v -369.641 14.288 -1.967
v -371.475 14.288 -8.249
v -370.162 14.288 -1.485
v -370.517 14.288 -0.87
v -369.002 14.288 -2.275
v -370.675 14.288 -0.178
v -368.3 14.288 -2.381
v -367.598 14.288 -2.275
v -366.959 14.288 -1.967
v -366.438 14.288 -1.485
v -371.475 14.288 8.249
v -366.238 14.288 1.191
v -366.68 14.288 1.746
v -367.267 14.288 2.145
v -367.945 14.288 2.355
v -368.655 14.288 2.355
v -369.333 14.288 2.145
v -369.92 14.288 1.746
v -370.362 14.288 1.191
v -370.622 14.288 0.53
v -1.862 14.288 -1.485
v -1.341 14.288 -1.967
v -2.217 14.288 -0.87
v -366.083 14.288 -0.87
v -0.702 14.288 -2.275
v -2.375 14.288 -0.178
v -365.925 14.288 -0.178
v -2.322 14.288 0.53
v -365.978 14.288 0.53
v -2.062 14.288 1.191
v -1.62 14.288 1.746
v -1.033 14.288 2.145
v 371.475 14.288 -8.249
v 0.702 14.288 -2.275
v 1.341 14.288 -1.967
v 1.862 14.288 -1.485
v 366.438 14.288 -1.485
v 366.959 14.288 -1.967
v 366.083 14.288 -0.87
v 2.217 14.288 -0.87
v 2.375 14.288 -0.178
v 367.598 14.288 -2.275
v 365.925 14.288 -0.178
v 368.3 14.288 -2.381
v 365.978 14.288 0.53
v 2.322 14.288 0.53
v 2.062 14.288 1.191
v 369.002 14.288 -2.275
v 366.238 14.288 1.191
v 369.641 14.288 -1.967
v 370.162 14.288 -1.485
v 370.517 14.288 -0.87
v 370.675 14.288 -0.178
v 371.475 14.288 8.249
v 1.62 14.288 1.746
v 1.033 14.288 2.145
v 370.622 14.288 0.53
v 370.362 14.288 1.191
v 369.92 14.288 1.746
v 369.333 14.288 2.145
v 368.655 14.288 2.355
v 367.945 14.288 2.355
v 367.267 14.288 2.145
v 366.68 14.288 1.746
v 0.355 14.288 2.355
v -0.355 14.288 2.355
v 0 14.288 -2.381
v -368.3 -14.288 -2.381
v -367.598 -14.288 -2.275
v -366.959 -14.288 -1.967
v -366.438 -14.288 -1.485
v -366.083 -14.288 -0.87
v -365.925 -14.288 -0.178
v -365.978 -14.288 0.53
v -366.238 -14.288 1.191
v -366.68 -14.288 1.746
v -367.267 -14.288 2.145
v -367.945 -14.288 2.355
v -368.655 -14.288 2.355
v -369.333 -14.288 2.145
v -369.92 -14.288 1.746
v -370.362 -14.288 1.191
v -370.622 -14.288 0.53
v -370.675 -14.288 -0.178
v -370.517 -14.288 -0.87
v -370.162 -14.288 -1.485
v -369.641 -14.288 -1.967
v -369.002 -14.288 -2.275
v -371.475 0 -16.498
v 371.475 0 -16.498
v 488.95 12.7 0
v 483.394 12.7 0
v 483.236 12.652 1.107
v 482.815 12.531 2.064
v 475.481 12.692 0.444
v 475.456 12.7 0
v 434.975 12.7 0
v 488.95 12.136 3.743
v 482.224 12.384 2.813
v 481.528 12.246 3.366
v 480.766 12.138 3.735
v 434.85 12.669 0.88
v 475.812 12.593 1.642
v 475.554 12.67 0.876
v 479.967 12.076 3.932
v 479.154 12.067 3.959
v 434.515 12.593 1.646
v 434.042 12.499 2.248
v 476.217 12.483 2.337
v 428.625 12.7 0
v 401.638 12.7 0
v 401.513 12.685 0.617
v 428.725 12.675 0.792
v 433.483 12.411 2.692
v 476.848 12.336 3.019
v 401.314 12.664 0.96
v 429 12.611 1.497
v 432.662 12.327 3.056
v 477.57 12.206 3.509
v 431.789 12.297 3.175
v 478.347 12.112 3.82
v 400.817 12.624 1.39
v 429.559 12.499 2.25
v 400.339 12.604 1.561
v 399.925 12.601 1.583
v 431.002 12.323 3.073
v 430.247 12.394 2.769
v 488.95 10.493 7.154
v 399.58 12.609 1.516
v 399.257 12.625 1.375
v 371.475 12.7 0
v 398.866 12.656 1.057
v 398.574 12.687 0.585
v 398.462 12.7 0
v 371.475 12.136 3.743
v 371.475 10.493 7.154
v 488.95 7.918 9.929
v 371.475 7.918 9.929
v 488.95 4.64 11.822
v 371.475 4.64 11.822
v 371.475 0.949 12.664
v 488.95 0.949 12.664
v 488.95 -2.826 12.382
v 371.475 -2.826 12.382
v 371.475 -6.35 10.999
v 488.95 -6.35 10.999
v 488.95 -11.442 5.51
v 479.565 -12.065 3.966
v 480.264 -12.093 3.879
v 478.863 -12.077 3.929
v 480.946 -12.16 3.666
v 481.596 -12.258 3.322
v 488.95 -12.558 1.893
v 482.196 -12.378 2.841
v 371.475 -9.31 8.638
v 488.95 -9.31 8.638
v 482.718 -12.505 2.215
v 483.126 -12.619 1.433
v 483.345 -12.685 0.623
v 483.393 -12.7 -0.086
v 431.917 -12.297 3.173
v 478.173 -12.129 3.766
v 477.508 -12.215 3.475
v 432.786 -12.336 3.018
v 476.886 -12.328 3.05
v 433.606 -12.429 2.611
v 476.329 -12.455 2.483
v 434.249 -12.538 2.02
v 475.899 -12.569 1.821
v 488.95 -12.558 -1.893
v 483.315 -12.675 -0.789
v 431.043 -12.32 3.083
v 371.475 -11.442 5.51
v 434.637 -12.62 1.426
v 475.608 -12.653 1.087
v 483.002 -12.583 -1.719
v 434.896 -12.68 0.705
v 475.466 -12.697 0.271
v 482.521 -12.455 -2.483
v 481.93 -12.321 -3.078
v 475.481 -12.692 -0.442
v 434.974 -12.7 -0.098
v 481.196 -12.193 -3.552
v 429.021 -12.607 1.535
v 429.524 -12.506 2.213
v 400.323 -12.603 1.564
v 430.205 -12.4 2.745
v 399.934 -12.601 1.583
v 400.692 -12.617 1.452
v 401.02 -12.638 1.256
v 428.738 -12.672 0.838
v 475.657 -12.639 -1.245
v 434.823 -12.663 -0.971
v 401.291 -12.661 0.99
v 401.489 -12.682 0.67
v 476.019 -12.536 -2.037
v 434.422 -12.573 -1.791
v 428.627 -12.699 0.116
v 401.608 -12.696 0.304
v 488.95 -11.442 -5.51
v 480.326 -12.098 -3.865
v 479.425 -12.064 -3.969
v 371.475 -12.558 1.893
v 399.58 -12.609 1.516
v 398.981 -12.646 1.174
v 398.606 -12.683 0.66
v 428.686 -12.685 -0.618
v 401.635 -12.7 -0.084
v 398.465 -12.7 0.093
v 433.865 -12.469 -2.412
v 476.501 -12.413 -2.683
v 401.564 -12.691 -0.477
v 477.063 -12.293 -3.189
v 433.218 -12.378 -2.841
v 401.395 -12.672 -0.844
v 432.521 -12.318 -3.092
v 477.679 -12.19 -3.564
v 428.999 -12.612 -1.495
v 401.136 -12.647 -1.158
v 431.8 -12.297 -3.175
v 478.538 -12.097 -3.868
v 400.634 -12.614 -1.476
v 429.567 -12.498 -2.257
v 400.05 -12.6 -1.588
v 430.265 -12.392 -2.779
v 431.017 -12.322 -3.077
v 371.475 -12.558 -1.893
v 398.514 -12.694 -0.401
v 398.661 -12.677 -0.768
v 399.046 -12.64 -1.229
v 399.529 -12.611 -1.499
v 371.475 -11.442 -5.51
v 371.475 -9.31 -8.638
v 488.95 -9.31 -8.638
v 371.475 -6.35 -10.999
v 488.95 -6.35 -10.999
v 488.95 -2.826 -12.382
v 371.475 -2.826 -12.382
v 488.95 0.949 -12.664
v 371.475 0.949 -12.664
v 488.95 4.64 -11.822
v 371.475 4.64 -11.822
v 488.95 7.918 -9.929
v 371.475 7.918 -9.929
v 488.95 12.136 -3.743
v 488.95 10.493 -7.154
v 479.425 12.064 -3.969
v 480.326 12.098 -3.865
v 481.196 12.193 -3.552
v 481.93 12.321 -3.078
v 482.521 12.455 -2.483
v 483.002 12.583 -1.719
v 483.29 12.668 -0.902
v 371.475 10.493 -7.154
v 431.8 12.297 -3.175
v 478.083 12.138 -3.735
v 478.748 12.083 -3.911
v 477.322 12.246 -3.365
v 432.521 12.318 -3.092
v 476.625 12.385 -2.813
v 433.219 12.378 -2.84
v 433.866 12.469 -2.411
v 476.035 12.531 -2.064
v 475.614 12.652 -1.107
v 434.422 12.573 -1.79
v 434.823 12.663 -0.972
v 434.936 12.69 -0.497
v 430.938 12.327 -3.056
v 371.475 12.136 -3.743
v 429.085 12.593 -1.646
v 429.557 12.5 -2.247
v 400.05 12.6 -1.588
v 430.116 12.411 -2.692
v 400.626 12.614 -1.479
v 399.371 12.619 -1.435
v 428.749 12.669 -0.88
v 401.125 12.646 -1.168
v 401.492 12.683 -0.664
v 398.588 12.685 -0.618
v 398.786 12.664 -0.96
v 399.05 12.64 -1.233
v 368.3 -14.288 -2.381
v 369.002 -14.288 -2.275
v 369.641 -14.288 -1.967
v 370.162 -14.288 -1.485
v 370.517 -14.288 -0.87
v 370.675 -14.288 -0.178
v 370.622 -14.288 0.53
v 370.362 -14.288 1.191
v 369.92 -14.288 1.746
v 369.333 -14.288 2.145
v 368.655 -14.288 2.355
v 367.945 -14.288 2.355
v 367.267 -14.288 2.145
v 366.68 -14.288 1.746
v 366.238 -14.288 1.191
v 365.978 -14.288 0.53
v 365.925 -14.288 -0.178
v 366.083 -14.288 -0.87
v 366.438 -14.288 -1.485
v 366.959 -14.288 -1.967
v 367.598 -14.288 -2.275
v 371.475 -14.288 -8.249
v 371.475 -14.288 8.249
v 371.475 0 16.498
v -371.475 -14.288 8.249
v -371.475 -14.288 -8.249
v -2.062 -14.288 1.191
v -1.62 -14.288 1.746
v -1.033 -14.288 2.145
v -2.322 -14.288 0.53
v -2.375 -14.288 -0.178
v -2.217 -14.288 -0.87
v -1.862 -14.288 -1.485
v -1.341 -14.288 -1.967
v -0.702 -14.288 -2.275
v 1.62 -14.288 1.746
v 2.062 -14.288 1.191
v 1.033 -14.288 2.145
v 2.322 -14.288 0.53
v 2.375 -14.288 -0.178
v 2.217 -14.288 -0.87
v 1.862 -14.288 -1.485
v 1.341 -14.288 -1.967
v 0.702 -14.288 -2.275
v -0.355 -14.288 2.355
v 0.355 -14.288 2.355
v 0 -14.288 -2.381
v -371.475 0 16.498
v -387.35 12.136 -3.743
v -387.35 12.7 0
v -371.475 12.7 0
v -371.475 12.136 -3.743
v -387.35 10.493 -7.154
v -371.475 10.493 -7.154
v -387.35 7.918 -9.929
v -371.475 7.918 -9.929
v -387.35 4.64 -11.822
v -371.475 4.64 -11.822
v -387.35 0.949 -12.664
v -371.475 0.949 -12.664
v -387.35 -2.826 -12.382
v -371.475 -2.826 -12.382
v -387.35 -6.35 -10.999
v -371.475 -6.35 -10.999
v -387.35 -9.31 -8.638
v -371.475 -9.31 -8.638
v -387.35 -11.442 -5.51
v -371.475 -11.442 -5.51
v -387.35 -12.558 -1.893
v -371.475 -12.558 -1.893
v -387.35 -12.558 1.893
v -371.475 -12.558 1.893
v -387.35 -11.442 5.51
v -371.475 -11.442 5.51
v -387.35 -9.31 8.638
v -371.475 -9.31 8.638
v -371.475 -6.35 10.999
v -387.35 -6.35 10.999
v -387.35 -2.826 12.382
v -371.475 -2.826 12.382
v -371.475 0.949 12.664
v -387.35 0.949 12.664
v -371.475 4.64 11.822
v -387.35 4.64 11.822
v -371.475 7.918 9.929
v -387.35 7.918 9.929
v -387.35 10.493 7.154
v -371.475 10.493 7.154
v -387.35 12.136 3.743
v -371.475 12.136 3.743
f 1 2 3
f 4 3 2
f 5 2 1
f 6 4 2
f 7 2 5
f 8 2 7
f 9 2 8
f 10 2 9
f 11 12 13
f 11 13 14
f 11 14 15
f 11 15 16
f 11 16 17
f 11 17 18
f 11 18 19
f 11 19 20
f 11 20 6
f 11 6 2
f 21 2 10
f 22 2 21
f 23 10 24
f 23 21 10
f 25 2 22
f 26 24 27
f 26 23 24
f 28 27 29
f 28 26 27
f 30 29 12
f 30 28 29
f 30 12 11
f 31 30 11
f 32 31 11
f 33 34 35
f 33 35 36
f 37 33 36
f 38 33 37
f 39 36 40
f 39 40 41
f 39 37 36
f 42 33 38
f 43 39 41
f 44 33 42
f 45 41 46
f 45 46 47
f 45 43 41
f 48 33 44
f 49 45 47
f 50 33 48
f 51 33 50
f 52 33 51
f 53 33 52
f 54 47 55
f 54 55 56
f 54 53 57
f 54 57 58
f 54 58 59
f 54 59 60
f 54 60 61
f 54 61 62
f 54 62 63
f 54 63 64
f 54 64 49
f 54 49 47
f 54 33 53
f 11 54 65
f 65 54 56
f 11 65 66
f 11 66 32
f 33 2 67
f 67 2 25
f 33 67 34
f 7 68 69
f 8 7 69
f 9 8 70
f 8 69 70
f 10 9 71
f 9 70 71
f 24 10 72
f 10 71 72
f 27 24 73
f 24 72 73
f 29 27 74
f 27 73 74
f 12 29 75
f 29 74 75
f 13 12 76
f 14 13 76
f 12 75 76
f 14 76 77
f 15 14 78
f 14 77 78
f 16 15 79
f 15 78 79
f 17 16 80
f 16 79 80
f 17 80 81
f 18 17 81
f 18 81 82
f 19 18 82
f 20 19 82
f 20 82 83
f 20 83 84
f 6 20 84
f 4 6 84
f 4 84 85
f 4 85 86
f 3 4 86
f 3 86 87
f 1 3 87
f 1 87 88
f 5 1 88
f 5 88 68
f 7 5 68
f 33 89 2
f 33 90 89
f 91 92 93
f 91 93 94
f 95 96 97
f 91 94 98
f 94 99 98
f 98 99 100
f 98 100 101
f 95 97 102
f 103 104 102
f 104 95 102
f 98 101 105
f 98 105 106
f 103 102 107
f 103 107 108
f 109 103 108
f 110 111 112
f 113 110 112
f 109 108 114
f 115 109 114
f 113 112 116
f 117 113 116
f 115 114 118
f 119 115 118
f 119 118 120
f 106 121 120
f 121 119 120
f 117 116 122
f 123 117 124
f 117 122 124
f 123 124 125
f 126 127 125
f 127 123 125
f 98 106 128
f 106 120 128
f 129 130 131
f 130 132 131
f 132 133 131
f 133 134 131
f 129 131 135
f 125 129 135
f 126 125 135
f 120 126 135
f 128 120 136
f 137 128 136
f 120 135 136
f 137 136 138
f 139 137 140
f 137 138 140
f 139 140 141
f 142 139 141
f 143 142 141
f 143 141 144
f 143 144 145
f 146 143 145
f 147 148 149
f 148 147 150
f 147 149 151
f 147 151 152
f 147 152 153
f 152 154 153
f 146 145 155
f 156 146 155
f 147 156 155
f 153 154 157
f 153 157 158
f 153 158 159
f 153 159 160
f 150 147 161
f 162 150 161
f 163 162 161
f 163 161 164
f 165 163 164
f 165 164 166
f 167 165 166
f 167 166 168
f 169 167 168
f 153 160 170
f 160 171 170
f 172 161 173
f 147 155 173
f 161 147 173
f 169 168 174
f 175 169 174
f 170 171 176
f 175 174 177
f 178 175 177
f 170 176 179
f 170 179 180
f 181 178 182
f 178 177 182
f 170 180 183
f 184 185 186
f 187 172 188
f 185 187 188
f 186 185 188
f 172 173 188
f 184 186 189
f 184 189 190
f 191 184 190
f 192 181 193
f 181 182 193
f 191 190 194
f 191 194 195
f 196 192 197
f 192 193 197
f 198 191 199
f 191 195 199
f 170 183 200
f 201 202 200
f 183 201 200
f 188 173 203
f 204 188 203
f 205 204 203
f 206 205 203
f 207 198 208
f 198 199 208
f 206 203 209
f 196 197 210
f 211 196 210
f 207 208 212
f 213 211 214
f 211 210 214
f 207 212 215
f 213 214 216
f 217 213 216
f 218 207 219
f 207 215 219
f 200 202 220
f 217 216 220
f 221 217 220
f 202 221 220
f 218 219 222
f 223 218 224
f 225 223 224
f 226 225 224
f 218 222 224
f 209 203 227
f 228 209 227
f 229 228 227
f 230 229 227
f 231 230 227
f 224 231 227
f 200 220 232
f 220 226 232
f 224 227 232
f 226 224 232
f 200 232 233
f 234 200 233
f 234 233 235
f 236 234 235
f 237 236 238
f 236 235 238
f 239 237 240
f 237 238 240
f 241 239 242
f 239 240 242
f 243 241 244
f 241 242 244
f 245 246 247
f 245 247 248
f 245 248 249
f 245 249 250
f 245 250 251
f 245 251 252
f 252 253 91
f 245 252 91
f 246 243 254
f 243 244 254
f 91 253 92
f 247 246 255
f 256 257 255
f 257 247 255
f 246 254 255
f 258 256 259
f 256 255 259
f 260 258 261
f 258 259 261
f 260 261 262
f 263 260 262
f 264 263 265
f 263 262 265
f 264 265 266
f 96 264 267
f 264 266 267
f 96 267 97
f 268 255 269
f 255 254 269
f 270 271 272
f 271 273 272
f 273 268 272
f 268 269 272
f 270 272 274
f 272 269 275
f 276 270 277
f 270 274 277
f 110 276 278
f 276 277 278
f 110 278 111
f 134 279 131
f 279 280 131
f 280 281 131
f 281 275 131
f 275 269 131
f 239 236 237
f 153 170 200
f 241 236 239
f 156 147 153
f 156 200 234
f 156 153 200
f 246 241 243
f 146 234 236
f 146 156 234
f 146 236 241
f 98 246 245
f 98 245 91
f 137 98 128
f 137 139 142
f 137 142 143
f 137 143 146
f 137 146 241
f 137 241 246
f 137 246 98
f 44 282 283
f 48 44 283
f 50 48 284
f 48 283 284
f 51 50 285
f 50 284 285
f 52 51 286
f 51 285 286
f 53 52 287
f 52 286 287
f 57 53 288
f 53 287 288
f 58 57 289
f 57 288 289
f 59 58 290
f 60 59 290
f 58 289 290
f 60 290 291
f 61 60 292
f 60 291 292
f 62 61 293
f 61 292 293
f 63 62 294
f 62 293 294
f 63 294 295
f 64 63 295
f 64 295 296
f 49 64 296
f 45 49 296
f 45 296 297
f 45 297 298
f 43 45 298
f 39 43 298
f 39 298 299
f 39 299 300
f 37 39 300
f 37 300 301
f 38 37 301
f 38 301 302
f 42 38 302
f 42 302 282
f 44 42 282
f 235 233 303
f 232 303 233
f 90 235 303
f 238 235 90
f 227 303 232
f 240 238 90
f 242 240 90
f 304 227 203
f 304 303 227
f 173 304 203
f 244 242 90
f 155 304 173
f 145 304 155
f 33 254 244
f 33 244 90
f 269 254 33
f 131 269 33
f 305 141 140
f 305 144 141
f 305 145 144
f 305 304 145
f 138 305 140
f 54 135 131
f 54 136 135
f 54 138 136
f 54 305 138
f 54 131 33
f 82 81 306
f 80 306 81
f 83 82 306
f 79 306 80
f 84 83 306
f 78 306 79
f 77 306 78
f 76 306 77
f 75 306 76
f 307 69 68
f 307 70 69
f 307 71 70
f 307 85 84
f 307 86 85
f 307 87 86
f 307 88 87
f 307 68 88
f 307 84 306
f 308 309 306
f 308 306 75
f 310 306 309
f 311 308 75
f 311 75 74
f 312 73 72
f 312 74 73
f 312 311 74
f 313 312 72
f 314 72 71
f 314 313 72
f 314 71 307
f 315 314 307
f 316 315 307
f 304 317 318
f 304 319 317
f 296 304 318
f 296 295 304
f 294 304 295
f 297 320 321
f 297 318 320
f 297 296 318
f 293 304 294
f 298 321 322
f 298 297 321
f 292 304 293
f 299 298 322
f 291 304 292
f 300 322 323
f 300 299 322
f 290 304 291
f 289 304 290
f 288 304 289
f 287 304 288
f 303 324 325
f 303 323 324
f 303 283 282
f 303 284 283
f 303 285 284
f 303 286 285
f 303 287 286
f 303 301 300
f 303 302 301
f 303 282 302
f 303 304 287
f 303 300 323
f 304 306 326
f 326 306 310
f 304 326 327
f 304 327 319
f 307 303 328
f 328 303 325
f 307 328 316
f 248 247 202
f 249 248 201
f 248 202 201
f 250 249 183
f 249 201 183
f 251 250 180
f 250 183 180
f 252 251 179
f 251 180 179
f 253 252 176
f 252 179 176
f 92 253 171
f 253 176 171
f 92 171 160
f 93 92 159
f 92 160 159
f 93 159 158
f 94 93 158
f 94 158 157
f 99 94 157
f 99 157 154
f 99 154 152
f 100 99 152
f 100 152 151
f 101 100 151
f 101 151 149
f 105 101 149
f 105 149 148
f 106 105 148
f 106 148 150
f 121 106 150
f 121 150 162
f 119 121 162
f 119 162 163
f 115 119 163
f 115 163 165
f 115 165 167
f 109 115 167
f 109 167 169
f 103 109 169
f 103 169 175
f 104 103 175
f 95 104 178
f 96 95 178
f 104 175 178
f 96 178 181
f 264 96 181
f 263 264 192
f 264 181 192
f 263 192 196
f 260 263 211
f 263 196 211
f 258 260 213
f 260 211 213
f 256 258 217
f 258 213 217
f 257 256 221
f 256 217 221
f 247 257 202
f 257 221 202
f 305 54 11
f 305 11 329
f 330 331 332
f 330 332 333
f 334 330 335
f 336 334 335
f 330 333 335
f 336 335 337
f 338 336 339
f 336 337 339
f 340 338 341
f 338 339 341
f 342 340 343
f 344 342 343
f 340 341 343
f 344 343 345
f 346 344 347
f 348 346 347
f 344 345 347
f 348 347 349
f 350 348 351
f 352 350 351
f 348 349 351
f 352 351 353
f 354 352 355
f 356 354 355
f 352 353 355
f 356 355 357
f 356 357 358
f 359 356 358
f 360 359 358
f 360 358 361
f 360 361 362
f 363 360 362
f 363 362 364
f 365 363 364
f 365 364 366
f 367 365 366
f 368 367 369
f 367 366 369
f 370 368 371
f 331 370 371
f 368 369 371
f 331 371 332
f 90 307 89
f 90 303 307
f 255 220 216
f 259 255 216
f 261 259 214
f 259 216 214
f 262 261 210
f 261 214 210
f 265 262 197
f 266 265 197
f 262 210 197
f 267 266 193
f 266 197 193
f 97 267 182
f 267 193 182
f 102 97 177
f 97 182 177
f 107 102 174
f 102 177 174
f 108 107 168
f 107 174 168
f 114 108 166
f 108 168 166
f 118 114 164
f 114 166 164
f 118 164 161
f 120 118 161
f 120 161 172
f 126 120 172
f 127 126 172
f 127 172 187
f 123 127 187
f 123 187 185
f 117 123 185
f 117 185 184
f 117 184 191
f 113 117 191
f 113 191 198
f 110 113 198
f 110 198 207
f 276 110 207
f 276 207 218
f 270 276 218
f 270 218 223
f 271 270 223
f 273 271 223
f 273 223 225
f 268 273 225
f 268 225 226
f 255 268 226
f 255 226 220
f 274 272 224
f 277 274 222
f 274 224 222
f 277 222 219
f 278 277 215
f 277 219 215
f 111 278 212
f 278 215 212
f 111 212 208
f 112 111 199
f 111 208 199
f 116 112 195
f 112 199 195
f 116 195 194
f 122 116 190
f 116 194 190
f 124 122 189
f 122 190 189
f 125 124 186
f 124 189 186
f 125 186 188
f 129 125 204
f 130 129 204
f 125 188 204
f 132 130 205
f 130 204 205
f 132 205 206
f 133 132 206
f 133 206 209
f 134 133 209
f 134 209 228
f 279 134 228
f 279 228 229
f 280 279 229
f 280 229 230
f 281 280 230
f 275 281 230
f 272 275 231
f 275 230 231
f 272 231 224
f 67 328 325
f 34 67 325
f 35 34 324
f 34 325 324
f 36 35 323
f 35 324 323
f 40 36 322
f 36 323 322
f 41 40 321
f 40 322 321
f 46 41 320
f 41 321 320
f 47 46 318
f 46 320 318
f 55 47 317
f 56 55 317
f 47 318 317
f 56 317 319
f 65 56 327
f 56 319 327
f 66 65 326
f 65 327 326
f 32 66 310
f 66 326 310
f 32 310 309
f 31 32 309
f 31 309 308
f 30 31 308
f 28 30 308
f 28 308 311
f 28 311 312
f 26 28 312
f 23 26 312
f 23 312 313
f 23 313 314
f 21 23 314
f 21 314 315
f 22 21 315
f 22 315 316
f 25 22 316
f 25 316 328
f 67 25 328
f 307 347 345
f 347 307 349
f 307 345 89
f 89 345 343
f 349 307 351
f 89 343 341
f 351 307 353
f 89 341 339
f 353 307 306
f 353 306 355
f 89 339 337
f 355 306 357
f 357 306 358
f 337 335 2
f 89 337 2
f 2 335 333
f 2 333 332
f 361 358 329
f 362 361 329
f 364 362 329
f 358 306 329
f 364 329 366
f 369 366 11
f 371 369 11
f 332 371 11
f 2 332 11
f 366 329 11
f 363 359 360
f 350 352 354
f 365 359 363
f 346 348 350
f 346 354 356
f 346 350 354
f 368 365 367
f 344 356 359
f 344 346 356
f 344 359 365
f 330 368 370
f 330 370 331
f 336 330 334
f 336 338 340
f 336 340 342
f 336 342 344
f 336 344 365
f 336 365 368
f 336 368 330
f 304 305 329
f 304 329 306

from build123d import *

# Parameters (mm, degrees)
PAD_DEPTH     = 371.475
SKETCH001_R   = 12.7
PAD001_DEPTH  = 117.475
SKETCH002_R   = 12.7
PAD002_DEPTH  = 15.875
SKETCH003_R   = 2.38125
SKETCH003_R_2 = 1.5875
SKETCH003_R_3 = 3.96875
SKETCH003_R_4 = 3.175
POCKET_DEPTH  = 50.8


with BuildPart() as part:
    # Sketch → Pad (new body, symmetric)
    with BuildSketch(Plane.YZ):
        Polygon((14.2875, -8.248892), (14.2875, 8.248892), (0, 16.497784), (-14.2875, 8.248892), (-14.2875, -8.248892), (0, -16.497784), align=None)
    extrude(amount=PAD_DEPTH, both=True)

    # Sketch001 (on Face8 of Pad) → Pad001 (join)
    with BuildSketch(Plane.YZ.offset(371.475)):
        Circle(SKETCH001_R)
    extrude(amount=PAD001_DEPTH)

    # Sketch002 (on Face4 of Pad001) → Pad002 (join)
    with BuildSketch(Plane(origin=(-371.475, 0, 0), x_dir=(0, 1, 0), z_dir=(-1, 0, 0))):
        Circle(SKETCH002_R)
    extrude(amount=PAD002_DEPTH)

    # Sketch003 (on Face8 of Pad002) → Pocket (cut)
    with BuildSketch(Plane(origin=(0, -14.2875, 0), x_dir=(0, 0, -1), z_dir=(0, -1, 0))):
        Circle(SKETCH003_R)
        with Locations((0, 368.3)):
            Circle(SKETCH003_R)
        with Locations((0, -368.3)):
            Circle(SKETCH003_R)
        with Locations((0, 400.05)):
            Circle(SKETCH003_R_2)
        with Locations((0, 479.425)):
            Circle(SKETCH003_R_3)
        with Locations((0, 431.8)):
            Circle(SKETCH003_R_4)
    extrude(amount=-POCKET_DEPTH, mode=Mode.SUBTRACT)


solid = part.part
